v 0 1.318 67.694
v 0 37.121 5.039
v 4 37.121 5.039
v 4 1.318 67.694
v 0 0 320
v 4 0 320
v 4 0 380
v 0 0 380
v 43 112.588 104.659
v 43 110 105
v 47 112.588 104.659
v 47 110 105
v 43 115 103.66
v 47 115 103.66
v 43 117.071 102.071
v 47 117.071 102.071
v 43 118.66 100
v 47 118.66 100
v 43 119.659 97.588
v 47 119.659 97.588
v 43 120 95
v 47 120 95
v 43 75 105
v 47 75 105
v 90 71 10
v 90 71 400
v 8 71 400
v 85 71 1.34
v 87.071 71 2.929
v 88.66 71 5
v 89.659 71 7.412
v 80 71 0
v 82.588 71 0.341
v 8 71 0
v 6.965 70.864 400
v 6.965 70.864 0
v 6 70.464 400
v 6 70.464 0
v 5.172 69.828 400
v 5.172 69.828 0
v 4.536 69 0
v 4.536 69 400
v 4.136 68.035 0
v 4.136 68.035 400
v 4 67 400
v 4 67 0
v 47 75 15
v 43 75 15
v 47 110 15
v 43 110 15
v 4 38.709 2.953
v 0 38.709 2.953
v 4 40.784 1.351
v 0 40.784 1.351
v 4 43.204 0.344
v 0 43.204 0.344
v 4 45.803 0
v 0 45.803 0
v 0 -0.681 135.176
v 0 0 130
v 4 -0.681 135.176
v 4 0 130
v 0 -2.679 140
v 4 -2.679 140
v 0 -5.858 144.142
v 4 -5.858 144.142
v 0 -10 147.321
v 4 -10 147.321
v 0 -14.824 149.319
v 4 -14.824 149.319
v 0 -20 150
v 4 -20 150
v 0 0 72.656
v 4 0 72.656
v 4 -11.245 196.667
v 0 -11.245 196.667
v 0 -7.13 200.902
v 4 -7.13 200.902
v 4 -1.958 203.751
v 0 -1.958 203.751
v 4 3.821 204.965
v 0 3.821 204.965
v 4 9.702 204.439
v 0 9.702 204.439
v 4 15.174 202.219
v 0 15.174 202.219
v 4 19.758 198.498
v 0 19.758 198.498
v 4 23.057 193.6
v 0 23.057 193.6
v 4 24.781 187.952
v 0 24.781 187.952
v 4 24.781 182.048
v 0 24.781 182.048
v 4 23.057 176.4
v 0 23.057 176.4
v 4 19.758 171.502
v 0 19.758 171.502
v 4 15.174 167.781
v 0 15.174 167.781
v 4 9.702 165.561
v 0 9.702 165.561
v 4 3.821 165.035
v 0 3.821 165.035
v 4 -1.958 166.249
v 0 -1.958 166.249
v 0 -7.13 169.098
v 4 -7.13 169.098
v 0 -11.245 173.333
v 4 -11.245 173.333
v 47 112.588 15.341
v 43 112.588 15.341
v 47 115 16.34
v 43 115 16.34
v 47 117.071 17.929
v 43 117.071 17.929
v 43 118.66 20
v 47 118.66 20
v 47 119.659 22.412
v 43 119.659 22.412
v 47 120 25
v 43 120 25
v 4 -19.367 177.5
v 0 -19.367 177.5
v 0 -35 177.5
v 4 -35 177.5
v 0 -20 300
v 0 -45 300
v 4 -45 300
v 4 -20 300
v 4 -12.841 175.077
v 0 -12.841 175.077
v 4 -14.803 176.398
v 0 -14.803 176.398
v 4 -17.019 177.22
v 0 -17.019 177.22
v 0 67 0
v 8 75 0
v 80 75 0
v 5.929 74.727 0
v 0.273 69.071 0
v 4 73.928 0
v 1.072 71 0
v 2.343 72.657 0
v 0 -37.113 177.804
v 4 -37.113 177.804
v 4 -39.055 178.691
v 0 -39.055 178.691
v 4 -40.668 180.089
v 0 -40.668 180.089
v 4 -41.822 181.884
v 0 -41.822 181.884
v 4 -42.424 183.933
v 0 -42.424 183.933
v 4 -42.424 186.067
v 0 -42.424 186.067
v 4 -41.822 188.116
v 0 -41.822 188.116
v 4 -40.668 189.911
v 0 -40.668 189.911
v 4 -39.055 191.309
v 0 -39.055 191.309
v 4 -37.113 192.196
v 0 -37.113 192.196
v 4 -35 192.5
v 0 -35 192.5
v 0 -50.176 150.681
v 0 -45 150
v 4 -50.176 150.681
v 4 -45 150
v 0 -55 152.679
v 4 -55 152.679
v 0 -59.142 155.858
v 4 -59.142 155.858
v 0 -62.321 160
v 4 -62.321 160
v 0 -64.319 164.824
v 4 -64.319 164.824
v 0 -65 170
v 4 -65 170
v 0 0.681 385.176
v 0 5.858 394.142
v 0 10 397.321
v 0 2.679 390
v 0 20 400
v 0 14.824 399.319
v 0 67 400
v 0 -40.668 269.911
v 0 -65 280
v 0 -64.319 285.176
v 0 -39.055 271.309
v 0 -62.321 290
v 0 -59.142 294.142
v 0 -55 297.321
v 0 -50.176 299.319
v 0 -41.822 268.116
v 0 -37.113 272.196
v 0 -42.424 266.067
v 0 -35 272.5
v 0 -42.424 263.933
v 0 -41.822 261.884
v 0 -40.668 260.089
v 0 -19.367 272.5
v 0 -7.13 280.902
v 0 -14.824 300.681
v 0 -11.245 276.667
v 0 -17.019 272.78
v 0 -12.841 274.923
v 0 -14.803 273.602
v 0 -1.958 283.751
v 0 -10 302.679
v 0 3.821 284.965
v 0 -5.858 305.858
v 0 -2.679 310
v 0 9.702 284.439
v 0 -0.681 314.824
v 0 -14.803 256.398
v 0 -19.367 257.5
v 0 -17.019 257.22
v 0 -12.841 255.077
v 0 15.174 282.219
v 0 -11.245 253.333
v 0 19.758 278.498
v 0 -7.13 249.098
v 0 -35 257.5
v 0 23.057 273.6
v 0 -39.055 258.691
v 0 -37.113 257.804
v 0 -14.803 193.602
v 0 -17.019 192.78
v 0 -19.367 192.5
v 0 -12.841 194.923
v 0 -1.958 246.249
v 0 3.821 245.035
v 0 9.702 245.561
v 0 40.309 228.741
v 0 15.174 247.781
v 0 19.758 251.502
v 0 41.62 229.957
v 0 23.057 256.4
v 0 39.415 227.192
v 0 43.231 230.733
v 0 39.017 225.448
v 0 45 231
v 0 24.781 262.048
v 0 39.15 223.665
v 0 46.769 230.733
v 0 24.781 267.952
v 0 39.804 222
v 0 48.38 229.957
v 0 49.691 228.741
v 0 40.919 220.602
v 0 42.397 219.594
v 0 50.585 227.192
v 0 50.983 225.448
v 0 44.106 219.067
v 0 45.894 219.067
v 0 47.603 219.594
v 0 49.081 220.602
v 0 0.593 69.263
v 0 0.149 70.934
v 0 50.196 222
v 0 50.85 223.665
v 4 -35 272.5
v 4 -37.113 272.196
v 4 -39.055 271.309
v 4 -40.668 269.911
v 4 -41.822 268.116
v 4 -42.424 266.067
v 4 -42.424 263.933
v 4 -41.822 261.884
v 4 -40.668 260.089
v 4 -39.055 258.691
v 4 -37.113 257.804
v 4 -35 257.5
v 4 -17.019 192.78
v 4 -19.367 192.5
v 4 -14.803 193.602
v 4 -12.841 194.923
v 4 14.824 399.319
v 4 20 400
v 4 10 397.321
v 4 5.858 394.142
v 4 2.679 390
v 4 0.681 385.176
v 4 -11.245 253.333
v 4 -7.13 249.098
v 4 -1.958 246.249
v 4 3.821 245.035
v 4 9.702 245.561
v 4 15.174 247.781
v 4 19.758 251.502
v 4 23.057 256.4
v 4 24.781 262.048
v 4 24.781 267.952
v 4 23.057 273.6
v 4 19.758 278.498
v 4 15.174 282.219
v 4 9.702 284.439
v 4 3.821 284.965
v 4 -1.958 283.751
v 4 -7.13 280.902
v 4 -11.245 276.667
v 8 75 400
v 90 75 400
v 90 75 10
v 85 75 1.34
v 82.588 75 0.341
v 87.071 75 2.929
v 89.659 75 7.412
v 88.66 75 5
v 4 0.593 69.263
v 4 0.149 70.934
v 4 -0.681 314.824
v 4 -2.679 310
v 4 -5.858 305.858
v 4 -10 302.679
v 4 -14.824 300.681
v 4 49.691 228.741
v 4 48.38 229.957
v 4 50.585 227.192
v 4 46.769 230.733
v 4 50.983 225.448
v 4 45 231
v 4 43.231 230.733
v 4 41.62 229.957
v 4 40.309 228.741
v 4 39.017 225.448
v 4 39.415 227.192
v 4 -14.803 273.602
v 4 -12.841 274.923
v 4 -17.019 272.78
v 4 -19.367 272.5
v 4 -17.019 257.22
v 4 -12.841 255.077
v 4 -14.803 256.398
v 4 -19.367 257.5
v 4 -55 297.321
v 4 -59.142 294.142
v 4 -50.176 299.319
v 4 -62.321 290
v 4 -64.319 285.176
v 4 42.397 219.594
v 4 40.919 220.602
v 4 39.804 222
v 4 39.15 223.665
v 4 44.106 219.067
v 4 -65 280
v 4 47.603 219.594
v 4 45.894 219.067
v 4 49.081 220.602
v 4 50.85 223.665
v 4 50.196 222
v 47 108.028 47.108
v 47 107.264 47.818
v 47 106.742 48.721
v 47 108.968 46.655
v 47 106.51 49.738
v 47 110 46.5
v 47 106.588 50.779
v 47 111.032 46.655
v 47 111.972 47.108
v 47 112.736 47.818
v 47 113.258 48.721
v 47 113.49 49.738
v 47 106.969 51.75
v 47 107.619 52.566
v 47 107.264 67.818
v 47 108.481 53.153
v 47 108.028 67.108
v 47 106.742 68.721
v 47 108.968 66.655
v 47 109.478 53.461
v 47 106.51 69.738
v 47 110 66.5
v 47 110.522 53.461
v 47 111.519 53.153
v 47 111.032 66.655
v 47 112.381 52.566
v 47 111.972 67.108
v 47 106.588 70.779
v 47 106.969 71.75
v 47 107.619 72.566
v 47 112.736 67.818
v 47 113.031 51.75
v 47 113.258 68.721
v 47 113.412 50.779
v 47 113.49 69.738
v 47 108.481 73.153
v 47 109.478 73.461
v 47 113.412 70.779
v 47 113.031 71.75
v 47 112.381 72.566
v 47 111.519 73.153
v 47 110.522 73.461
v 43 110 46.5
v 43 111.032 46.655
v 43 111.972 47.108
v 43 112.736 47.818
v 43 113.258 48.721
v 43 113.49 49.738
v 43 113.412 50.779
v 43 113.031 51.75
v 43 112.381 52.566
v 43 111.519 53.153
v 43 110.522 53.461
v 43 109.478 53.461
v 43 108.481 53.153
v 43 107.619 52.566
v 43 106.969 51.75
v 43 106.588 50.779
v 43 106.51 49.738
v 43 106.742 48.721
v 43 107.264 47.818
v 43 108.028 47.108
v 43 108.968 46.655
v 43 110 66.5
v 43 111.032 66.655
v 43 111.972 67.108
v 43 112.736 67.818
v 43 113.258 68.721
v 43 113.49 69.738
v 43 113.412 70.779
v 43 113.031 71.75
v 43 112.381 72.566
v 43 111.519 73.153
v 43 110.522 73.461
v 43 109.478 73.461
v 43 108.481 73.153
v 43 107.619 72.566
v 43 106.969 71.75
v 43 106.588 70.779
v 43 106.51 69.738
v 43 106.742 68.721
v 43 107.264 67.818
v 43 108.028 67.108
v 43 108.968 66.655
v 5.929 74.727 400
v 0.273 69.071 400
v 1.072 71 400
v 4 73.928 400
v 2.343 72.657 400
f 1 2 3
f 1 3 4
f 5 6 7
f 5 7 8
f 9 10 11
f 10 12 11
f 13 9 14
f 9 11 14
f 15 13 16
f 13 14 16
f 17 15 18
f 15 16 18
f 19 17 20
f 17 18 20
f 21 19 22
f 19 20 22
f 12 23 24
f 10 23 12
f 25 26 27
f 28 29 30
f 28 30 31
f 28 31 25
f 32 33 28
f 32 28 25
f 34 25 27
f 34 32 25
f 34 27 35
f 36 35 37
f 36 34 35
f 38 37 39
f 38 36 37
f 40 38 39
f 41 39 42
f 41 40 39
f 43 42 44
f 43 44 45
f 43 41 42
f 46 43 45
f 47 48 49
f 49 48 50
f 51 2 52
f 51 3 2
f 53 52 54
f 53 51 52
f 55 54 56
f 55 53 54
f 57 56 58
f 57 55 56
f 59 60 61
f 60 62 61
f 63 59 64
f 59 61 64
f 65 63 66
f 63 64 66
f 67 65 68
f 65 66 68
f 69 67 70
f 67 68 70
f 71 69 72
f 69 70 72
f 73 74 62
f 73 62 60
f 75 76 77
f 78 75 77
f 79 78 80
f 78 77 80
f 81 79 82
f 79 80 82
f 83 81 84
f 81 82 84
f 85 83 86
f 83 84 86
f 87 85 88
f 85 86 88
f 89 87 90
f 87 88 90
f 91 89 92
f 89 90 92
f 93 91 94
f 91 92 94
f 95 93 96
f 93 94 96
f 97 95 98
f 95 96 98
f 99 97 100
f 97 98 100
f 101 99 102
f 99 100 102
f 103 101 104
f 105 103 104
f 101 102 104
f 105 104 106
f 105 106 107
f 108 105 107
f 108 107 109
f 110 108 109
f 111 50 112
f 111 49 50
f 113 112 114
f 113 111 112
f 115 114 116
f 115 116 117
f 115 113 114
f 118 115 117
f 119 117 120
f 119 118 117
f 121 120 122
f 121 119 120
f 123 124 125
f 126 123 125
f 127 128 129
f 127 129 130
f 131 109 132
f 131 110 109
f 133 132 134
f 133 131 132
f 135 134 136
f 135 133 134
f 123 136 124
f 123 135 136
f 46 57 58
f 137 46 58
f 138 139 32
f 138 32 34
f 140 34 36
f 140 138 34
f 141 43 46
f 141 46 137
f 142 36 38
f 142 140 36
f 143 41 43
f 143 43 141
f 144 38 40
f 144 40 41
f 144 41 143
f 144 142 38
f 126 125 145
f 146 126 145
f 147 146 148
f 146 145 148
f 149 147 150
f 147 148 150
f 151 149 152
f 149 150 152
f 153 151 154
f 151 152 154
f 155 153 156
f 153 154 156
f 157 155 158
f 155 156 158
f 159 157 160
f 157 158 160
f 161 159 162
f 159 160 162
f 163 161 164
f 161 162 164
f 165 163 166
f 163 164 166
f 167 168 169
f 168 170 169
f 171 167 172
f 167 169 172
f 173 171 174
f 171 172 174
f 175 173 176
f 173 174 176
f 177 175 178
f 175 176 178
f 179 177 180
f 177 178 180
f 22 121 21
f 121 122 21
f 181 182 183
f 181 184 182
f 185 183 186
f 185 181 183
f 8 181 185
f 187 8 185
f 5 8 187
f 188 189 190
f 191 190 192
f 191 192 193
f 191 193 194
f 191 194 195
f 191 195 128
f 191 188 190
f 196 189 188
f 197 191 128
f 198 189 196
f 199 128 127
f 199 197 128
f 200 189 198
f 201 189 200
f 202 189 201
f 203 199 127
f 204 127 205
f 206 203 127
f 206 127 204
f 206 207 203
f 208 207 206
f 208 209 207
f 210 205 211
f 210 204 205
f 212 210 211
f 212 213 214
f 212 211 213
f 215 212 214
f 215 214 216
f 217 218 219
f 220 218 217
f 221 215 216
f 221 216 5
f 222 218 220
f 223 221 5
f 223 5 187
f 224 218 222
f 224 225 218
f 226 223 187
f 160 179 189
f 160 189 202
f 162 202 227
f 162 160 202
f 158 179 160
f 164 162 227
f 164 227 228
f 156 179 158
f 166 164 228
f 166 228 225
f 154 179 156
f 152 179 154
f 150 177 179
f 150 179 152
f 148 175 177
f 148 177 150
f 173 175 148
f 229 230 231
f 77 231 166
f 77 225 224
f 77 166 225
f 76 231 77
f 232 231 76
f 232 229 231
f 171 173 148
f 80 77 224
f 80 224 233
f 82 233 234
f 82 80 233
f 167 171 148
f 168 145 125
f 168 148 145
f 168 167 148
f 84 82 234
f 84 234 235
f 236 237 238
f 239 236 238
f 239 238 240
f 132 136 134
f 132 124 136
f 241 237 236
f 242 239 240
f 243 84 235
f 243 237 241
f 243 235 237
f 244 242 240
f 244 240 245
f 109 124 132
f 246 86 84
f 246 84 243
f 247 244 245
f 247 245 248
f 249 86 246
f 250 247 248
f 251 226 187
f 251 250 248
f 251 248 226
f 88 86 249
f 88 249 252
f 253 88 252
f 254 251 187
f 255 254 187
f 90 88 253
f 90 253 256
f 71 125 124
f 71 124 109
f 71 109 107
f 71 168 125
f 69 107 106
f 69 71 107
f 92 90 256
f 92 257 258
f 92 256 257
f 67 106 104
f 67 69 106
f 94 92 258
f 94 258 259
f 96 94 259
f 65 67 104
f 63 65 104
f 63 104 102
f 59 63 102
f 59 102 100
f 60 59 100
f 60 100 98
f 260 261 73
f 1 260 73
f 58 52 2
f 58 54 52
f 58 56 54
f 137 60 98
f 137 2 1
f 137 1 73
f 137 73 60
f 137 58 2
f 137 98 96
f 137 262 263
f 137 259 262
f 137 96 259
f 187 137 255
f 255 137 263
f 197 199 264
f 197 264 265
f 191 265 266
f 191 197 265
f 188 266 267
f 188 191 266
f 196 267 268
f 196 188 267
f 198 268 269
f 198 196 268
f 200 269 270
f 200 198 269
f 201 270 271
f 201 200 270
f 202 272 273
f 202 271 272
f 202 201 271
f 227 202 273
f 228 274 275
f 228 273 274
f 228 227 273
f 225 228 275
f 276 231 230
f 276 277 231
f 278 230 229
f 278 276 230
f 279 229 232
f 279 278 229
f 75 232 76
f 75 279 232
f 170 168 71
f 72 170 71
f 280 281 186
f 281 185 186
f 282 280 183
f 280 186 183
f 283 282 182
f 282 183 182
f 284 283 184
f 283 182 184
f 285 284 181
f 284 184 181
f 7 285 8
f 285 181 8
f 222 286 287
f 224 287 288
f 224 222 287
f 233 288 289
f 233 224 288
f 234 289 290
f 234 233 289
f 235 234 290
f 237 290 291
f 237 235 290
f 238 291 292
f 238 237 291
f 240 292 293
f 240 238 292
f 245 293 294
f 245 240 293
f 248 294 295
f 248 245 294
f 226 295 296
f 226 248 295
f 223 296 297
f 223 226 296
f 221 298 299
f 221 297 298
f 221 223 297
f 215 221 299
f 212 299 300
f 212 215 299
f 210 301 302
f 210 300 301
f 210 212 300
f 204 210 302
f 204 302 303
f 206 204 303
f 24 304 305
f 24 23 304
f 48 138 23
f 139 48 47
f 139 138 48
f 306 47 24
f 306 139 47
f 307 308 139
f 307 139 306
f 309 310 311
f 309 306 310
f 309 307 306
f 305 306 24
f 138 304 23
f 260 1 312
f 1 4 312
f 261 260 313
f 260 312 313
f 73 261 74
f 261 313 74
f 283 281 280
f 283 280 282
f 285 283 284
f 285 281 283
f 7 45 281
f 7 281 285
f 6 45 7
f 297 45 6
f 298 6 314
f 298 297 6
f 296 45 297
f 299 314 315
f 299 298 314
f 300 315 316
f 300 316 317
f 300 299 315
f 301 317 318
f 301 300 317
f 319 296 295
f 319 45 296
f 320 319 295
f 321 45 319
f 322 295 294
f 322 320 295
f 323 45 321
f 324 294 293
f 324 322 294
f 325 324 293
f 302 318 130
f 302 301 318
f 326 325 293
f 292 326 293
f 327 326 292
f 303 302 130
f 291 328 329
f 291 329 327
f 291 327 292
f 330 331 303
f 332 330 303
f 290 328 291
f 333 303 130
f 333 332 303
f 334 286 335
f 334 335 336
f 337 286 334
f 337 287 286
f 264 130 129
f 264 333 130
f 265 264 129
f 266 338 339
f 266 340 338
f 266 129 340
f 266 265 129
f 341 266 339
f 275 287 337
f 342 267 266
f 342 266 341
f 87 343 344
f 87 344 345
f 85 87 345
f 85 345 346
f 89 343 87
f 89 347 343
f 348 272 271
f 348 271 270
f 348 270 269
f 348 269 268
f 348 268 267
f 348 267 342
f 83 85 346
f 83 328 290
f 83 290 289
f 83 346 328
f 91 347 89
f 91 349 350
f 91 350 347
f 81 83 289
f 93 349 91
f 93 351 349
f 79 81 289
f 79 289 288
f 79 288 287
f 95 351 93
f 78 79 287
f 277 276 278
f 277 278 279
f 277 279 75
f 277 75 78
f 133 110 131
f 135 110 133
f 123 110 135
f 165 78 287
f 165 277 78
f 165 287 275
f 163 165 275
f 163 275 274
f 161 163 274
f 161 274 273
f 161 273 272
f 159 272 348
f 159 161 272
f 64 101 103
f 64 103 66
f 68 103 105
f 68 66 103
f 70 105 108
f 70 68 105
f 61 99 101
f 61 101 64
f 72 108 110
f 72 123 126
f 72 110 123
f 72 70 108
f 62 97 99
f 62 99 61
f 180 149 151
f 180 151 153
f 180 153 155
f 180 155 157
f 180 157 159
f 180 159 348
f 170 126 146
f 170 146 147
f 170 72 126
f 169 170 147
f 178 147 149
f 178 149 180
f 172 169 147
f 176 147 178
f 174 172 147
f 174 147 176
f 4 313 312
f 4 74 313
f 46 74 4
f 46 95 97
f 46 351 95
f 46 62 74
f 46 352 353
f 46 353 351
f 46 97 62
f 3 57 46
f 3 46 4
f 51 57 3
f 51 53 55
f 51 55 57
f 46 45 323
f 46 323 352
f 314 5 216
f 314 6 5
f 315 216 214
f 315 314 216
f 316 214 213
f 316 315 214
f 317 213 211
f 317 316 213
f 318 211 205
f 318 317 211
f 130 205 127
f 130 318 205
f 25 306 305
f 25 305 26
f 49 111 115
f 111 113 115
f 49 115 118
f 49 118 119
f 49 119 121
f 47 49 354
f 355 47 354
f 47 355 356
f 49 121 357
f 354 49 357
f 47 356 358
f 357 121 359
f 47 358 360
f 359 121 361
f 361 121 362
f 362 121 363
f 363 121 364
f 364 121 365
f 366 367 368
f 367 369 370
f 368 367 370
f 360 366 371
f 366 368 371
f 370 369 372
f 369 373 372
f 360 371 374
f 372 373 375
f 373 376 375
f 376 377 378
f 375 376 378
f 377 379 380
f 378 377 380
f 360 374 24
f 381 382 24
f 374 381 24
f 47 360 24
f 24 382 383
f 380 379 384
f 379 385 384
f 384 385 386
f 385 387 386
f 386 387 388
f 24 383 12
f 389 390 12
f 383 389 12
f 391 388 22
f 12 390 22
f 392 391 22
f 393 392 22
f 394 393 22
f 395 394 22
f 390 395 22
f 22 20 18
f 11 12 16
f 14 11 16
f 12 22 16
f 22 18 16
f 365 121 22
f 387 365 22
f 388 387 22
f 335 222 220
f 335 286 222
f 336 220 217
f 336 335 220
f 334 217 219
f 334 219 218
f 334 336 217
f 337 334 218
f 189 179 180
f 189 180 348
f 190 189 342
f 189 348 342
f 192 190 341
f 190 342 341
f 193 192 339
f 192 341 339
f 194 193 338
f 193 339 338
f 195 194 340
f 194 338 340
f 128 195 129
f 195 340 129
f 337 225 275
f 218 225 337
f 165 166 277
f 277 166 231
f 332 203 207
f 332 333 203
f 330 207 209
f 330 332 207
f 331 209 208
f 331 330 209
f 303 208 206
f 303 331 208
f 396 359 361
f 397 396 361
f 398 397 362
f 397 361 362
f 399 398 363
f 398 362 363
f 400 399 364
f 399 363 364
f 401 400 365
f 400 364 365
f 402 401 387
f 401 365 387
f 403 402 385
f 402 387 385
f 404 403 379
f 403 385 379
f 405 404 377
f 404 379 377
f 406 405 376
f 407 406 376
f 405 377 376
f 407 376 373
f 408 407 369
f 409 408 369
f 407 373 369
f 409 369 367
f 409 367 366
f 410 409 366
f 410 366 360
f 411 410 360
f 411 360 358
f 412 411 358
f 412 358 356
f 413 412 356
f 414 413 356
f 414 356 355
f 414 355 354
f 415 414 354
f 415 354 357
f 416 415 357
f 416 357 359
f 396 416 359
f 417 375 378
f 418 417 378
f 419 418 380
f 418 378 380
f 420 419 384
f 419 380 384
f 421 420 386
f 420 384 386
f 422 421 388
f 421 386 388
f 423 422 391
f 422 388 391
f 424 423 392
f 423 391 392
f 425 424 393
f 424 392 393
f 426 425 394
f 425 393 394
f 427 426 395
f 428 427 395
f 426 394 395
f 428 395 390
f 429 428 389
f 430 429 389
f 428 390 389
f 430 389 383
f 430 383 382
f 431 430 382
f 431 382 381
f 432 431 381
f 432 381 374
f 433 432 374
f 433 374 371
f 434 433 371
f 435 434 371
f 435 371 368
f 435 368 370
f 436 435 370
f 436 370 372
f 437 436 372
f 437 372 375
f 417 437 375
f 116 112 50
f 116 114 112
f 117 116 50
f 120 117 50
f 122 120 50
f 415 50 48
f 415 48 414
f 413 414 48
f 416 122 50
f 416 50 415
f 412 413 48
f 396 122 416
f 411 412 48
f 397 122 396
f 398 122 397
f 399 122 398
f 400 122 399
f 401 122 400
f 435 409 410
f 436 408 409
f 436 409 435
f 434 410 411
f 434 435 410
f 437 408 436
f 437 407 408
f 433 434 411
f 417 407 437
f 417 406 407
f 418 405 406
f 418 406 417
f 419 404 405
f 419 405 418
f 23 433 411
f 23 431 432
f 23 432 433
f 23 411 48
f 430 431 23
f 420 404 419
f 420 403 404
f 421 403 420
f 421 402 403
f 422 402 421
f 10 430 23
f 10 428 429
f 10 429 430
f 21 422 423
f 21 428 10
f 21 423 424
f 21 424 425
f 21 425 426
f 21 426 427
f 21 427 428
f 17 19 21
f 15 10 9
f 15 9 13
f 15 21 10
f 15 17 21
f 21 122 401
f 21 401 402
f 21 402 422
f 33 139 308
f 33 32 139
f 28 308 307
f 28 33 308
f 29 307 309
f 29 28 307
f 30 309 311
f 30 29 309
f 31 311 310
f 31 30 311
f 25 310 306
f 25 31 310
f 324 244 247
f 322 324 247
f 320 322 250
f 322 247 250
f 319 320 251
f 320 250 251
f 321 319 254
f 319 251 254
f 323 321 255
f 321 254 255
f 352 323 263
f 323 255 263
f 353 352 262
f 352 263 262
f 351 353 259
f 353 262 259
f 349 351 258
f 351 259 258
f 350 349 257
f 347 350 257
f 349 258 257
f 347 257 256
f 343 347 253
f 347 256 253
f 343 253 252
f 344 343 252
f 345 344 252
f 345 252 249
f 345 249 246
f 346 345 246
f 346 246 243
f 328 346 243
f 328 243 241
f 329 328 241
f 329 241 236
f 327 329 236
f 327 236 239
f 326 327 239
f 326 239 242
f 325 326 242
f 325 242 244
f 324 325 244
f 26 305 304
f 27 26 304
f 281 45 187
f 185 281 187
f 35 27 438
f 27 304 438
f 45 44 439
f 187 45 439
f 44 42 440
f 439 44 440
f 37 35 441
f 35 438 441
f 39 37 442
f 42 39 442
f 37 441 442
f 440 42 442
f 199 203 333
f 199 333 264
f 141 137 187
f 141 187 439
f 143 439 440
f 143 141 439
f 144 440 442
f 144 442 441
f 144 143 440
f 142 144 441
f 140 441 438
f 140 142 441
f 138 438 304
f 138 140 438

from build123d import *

# Parameters (mm, degrees)
SM_BASE_FLANGE_1_DEPTH = 400
CUT_EXTRUDE_1_DEPTH    = 10
FILLET_1_R             = 10
SKETCH_7_W             = 150
SKETCH_7_H             = 65
EXTRUDE_1_DEPTH        = 4
SKETCH_8_R             = 6
CUT_EXTRUDE_2_DEPTH    = 10
FILLET_2_R             = 10
FILLET_3_R             = 20
SKETCH_10_W            = 90
SKETCH_10_H            = 45
EXTRUDE_2_DEPTH        = 2
HOLE_WIZARD_7_0_7_1_D  = 7
FILLET_4_R             = 10
FILLET_5_R             = 20


# Sheet-metal steps are written as plain solids
with BuildPart() as part:
    # Sketch 1 → 基体-法兰1 (new body)
    with BuildSketch(Plane.XY):
        with BuildLine():
            Line((0, 0), (0, 67))
            ThreePointArc((0, 67), (2.343145751, 72.656854249), (8, 75))
            Line((8, 75), (90, 75))
            Line((90, 75), (90, 71))
            Line((90, 71), (8, 71))
            ThreePointArc((8, 71), (5.171572875, 69.828427125), (4, 67))
            Line((4, 67), (4, 0))
            Line((4, 0), (0, 0))
        make_face()
    extrude(amount=SM_BASE_FLANGE_1_DEPTH)

    # 草图6 → 切除-拉伸1 (cut)
    with BuildSketch(Plane.ZY):
        Polygon((0, 0), (0, 40), (70, 0), align=None)
    extrude(amount=-CUT_EXTRUDE_1_DEPTH, mode=Mode.SUBTRACT)

    # 圆角1
    fillet_1_edges = [part.edges().sort_by_distance(p)[0] for p in [
        (2, 40, 0),
        (2, 0, 70),
        (90, 73, 0),
    ]]
    fillet(fillet_1_edges, radius=FILLET_1_R)

    # 草图7 → 凸台-拉伸1 (add)
    with BuildSketch(Plane.ZY):
        with Locations((225, -32.5)):
            Rectangle(SKETCH_7_W, SKETCH_7_H)
    extrude(amount=-EXTRUDE_1_DEPTH)

    # 草图8 → 切除-拉伸2 (cut)
    with BuildSketch(Plane.ZY):
        with Locations((225, 45)):
            Circle(SKETCH_8_R)
        with BuildLine():
            Line((192.5, -35), (192.5, -13.540496218))
            ThreePointArc((192.5, -13.540496218), (185, 25), (177.5, -13.540496218))
            Line((177.5, -13.540496218), (177.5, -35))
            ThreePointArc((177.5, -35), (185, -42.5), (192.5, -35))
        make_face()
        with BuildLine():
            Line((257.5, -35), (257.5, -13.540496218))
            ThreePointArc((257.5, -13.540496218), (265, 25), (272.5, -13.540496218))
            Line((272.5, -13.540496218), (272.5, -35))
            ThreePointArc((272.5, -35), (265, -42.5), (257.5, -35))
        make_face()
    extrude(amount=-CUT_EXTRUDE_2_DEPTH, mode=Mode.SUBTRACT)

    # 圆角2
    fillet_2_edges = [part.edges().sort_by_distance(p)[0] for p in [
        (2, -13.540496218, 177.5),
        (2, -13.540496218, 192.5),
        (2, -13.540496218, 257.5),
        (2, -13.540496218, 272.5),
    ]]
    fillet(fillet_2_edges, radius=FILLET_2_R)

    # 圆角3
    fillet_3_edges = [part.edges().sort_by_distance(p)[0] for p in [
        (2, -65, 150),
        (2, 0, 150),
        (2, 0, 300),
        (2, -65, 300),
    ]]
    fillet(fillet_3_edges, radius=FILLET_3_R)

    # 草图10 → 凸台-拉伸2 (add, symmetric)
    with BuildSketch(Plane.ZY.offset(-45)):
        with Locations((60, 97.5)):
            Rectangle(SKETCH_10_W, SKETCH_10_H)
    extrude(amount=EXTRUDE_2_DEPTH, both=True)

    # Ø7.0 (7) 直径孔1 (through all)
    with Locations(Plane.ZY.offset(-43)):
        with Locations((50, 110), (70, 110)):
            Hole(HOLE_WIZARD_7_0_7_1_D / 2)

    # 圆角4
    fillet_4_edges = [part.edges().sort_by_distance(p)[0] for p in [
        (45, 120, 105),
        (45, 120, 15),
    ]]
    fillet(fillet_4_edges, radius=FILLET_4_R)

    # 圆角5
    fillet_5_edges = [part.edges().sort_by_distance(p)[0] for p in [
        (2, 0, 400),
    ]]
    fillet(fillet_5_edges, radius=FILLET_5_R)


solid = part.part
